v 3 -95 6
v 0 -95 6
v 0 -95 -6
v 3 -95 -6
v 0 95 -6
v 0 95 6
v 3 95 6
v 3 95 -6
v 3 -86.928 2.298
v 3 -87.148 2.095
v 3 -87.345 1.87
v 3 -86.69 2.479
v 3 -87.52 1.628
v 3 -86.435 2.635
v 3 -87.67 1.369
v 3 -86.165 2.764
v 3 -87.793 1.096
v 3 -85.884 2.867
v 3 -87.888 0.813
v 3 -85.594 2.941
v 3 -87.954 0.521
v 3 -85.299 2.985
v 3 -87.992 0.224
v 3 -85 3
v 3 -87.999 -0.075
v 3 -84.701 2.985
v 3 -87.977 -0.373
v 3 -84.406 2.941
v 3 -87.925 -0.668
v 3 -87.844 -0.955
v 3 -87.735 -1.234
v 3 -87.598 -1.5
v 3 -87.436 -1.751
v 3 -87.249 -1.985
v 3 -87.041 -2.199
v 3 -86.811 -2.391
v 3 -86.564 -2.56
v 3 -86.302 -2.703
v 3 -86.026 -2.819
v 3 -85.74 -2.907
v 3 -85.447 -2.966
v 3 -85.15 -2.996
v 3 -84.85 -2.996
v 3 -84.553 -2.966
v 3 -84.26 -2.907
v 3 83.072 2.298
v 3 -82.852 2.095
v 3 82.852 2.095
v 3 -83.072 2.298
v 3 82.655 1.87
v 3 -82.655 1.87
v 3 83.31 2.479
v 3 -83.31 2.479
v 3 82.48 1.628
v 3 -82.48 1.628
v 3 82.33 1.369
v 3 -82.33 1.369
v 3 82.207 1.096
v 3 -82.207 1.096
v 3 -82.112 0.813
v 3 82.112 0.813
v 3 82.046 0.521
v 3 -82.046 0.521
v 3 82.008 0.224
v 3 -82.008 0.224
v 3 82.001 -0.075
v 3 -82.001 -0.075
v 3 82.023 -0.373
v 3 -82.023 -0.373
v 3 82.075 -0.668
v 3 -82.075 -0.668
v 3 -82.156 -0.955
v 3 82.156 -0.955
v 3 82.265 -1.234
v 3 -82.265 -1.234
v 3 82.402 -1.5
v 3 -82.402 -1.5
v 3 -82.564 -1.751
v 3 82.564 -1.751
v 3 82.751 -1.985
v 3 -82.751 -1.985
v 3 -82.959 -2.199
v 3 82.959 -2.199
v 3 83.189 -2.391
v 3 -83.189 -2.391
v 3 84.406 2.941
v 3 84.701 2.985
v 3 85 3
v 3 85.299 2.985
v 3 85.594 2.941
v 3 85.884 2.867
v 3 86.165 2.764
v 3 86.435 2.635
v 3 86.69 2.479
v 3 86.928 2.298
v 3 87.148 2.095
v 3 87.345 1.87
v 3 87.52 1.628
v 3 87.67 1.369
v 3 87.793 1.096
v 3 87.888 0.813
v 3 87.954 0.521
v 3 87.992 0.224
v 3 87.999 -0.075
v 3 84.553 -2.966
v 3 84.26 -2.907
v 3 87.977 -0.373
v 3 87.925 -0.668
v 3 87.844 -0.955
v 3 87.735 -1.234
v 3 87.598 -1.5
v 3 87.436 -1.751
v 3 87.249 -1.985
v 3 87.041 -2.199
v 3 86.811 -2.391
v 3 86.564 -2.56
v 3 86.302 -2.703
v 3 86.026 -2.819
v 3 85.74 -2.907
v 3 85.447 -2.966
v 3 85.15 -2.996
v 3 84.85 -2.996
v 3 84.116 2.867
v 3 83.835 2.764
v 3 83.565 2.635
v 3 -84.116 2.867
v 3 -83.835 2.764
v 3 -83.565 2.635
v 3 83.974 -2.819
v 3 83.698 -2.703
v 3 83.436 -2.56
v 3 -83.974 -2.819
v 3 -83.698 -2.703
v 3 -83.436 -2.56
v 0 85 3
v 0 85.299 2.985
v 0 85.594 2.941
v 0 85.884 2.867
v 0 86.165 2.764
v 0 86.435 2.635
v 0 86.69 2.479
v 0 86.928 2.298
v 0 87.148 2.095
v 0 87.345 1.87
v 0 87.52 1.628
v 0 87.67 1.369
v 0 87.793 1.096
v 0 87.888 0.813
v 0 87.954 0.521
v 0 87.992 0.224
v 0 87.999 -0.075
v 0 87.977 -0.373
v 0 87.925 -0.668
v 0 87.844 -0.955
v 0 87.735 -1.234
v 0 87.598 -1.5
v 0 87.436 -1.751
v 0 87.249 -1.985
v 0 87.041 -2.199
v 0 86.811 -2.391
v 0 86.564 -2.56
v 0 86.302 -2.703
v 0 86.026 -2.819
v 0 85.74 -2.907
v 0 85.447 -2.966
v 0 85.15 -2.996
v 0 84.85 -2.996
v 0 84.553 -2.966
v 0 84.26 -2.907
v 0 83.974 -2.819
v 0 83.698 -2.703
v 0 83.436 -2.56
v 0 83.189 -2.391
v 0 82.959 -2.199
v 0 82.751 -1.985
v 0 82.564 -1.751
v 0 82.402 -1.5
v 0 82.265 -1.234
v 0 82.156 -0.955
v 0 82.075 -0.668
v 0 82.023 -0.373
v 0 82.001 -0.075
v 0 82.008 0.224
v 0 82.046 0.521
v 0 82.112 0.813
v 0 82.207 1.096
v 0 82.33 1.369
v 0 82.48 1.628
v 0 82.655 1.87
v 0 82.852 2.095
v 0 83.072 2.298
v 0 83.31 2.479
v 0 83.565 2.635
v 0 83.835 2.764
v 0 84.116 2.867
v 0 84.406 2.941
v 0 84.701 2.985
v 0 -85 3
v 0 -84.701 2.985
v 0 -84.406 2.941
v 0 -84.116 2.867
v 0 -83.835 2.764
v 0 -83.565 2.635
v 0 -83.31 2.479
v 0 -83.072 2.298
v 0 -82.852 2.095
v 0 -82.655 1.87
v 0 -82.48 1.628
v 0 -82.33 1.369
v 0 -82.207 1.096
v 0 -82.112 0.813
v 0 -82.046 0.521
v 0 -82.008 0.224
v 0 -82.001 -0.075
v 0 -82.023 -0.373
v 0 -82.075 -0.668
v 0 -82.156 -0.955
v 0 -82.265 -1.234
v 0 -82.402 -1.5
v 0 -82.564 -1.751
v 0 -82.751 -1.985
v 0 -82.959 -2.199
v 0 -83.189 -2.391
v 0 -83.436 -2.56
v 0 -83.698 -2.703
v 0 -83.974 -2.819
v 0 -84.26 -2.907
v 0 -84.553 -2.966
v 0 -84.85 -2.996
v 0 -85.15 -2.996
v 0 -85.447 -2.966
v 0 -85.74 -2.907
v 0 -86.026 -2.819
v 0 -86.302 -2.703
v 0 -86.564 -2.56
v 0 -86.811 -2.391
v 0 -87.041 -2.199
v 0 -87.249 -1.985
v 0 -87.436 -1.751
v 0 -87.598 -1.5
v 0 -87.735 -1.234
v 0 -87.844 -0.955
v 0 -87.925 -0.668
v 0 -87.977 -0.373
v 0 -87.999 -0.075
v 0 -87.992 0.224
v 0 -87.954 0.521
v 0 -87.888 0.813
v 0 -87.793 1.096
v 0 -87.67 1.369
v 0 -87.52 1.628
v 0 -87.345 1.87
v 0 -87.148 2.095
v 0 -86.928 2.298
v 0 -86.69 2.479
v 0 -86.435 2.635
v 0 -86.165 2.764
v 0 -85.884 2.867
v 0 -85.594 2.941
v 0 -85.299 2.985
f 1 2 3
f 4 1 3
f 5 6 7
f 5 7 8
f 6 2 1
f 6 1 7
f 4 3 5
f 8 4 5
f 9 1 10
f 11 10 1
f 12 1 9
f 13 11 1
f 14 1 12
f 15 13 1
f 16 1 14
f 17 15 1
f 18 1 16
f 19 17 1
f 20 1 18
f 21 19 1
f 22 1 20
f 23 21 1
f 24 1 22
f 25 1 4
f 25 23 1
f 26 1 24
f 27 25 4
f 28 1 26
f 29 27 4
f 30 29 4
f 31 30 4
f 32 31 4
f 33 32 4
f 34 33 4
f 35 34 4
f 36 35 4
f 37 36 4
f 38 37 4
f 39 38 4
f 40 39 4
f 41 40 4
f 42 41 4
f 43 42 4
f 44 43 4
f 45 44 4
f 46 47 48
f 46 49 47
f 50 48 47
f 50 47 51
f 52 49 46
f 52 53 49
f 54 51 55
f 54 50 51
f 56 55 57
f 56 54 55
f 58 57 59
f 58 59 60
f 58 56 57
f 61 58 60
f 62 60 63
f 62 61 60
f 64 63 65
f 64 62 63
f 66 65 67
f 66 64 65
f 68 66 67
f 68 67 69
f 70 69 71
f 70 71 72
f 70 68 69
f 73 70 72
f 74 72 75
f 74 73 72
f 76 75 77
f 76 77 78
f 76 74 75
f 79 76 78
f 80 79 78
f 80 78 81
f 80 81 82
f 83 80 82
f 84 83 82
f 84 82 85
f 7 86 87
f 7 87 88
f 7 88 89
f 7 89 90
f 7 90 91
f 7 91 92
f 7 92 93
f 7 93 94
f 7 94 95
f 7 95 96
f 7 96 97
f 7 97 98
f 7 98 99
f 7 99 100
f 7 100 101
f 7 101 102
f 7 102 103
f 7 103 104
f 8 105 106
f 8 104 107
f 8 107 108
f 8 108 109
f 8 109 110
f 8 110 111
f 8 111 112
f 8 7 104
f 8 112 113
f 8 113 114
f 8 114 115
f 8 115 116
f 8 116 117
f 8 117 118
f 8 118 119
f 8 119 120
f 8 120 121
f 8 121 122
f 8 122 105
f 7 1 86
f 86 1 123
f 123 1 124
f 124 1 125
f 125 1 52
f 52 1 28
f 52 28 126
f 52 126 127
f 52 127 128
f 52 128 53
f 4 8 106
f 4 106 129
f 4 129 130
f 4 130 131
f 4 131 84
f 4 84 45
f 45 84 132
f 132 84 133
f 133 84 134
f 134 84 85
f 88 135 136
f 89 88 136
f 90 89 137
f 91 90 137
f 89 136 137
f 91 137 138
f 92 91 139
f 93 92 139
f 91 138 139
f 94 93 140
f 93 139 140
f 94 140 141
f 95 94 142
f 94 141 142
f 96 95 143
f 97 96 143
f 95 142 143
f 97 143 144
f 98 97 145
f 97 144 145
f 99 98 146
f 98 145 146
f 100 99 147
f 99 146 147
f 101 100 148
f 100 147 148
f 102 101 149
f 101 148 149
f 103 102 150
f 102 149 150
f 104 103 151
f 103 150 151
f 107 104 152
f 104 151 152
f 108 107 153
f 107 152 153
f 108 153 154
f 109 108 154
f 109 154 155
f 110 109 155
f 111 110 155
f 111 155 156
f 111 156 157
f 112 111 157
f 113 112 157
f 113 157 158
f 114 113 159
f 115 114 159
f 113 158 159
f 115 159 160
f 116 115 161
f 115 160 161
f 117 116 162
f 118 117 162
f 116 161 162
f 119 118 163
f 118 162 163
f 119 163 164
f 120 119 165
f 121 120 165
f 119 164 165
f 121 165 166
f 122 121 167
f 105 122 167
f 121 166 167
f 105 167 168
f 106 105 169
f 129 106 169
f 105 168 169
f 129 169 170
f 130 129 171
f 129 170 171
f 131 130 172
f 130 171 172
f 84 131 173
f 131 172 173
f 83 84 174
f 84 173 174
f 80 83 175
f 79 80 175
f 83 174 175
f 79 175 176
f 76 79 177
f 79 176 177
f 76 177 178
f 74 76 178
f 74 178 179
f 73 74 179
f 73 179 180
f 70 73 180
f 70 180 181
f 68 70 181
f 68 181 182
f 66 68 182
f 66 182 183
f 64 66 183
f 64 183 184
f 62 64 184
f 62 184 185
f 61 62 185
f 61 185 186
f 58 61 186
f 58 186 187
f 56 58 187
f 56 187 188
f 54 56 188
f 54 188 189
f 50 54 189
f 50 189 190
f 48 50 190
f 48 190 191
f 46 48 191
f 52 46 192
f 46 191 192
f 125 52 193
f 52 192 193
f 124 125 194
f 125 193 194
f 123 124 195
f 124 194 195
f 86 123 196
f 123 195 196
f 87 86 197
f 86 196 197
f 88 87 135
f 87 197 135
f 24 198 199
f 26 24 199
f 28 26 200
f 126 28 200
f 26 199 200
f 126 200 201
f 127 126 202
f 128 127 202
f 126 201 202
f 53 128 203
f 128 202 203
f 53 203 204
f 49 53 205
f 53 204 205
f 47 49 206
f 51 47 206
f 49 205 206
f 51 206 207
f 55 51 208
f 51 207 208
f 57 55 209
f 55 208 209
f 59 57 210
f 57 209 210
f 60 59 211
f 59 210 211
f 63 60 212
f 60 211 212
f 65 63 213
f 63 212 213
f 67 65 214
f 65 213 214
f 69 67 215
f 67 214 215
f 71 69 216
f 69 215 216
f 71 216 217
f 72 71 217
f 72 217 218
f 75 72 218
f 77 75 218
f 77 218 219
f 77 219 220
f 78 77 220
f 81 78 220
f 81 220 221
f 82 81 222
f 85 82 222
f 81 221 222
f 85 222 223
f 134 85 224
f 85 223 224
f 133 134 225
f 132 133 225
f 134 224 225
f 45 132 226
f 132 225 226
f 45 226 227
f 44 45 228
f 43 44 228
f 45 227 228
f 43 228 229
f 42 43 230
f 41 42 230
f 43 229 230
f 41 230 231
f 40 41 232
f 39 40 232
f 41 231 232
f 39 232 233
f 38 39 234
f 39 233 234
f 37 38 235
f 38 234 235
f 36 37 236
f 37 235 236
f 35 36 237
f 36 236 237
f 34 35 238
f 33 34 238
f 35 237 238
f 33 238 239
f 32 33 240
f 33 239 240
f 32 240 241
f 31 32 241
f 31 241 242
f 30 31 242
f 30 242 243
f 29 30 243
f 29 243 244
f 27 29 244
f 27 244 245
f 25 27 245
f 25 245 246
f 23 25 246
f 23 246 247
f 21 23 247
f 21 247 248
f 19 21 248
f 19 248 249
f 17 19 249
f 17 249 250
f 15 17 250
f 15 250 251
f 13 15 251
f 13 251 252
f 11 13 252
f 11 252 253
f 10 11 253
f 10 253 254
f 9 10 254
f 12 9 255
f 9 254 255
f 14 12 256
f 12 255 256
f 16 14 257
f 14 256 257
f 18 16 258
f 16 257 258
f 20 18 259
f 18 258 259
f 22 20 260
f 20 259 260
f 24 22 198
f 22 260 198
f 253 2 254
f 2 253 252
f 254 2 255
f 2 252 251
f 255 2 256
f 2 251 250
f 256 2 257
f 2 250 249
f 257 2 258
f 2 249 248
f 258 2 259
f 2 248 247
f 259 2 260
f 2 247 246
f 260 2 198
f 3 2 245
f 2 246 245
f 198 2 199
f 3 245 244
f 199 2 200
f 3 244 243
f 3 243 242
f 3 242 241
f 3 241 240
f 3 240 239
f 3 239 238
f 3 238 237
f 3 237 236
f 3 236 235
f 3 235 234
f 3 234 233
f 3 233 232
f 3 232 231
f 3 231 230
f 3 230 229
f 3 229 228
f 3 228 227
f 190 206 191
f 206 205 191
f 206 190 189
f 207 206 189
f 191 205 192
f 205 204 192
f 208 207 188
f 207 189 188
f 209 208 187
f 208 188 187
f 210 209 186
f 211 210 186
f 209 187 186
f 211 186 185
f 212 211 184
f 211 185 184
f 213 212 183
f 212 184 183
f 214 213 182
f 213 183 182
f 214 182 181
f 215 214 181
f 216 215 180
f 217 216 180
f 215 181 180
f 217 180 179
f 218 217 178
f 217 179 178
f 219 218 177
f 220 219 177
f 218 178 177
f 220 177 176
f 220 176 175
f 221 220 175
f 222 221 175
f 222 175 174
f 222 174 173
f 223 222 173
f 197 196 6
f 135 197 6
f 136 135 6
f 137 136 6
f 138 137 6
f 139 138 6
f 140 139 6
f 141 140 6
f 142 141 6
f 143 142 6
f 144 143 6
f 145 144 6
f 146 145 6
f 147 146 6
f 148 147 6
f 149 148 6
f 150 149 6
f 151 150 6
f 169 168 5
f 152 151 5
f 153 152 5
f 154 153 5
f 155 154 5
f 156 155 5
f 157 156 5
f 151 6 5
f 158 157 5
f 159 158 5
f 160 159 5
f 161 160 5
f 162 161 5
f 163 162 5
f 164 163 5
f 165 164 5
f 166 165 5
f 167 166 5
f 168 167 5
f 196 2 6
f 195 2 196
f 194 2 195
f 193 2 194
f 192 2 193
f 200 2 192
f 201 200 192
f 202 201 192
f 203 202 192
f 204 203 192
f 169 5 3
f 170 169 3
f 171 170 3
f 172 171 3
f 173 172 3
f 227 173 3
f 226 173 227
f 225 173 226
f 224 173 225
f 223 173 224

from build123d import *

# Parameters (mm, degrees)
SKETCH1_W           = 12
SKETCH1_H           = 190
BOSS_EXTRUDE1_DEPTH = 3
SKETCH2_R           = 3
CUT_EXTRUDE1_DEPTH  = 3


with BuildPart() as part:
    # Sketch1 → Boss-Extrude1 (new body)
    with BuildSketch(Plane(origin=(0, 0, 0), x_dir=(0, 0, -1), z_dir=(1, 0, 0))):
        Rectangle(SKETCH1_W, SKETCH1_H)
    extrude(amount=BOSS_EXTRUDE1_DEPTH)

    # Sketch2 → Cut-Extrude1 (cut)
    with BuildSketch(Plane.ZY):
        with Locations((0, 85)):
            Circle(SKETCH2_R)
        with Locations((0, -85)):
            Circle(SKETCH2_R)
    extrude(amount=-CUT_EXTRUDE1_DEPTH, mode=Mode.SUBTRACT)


solid = part.part
